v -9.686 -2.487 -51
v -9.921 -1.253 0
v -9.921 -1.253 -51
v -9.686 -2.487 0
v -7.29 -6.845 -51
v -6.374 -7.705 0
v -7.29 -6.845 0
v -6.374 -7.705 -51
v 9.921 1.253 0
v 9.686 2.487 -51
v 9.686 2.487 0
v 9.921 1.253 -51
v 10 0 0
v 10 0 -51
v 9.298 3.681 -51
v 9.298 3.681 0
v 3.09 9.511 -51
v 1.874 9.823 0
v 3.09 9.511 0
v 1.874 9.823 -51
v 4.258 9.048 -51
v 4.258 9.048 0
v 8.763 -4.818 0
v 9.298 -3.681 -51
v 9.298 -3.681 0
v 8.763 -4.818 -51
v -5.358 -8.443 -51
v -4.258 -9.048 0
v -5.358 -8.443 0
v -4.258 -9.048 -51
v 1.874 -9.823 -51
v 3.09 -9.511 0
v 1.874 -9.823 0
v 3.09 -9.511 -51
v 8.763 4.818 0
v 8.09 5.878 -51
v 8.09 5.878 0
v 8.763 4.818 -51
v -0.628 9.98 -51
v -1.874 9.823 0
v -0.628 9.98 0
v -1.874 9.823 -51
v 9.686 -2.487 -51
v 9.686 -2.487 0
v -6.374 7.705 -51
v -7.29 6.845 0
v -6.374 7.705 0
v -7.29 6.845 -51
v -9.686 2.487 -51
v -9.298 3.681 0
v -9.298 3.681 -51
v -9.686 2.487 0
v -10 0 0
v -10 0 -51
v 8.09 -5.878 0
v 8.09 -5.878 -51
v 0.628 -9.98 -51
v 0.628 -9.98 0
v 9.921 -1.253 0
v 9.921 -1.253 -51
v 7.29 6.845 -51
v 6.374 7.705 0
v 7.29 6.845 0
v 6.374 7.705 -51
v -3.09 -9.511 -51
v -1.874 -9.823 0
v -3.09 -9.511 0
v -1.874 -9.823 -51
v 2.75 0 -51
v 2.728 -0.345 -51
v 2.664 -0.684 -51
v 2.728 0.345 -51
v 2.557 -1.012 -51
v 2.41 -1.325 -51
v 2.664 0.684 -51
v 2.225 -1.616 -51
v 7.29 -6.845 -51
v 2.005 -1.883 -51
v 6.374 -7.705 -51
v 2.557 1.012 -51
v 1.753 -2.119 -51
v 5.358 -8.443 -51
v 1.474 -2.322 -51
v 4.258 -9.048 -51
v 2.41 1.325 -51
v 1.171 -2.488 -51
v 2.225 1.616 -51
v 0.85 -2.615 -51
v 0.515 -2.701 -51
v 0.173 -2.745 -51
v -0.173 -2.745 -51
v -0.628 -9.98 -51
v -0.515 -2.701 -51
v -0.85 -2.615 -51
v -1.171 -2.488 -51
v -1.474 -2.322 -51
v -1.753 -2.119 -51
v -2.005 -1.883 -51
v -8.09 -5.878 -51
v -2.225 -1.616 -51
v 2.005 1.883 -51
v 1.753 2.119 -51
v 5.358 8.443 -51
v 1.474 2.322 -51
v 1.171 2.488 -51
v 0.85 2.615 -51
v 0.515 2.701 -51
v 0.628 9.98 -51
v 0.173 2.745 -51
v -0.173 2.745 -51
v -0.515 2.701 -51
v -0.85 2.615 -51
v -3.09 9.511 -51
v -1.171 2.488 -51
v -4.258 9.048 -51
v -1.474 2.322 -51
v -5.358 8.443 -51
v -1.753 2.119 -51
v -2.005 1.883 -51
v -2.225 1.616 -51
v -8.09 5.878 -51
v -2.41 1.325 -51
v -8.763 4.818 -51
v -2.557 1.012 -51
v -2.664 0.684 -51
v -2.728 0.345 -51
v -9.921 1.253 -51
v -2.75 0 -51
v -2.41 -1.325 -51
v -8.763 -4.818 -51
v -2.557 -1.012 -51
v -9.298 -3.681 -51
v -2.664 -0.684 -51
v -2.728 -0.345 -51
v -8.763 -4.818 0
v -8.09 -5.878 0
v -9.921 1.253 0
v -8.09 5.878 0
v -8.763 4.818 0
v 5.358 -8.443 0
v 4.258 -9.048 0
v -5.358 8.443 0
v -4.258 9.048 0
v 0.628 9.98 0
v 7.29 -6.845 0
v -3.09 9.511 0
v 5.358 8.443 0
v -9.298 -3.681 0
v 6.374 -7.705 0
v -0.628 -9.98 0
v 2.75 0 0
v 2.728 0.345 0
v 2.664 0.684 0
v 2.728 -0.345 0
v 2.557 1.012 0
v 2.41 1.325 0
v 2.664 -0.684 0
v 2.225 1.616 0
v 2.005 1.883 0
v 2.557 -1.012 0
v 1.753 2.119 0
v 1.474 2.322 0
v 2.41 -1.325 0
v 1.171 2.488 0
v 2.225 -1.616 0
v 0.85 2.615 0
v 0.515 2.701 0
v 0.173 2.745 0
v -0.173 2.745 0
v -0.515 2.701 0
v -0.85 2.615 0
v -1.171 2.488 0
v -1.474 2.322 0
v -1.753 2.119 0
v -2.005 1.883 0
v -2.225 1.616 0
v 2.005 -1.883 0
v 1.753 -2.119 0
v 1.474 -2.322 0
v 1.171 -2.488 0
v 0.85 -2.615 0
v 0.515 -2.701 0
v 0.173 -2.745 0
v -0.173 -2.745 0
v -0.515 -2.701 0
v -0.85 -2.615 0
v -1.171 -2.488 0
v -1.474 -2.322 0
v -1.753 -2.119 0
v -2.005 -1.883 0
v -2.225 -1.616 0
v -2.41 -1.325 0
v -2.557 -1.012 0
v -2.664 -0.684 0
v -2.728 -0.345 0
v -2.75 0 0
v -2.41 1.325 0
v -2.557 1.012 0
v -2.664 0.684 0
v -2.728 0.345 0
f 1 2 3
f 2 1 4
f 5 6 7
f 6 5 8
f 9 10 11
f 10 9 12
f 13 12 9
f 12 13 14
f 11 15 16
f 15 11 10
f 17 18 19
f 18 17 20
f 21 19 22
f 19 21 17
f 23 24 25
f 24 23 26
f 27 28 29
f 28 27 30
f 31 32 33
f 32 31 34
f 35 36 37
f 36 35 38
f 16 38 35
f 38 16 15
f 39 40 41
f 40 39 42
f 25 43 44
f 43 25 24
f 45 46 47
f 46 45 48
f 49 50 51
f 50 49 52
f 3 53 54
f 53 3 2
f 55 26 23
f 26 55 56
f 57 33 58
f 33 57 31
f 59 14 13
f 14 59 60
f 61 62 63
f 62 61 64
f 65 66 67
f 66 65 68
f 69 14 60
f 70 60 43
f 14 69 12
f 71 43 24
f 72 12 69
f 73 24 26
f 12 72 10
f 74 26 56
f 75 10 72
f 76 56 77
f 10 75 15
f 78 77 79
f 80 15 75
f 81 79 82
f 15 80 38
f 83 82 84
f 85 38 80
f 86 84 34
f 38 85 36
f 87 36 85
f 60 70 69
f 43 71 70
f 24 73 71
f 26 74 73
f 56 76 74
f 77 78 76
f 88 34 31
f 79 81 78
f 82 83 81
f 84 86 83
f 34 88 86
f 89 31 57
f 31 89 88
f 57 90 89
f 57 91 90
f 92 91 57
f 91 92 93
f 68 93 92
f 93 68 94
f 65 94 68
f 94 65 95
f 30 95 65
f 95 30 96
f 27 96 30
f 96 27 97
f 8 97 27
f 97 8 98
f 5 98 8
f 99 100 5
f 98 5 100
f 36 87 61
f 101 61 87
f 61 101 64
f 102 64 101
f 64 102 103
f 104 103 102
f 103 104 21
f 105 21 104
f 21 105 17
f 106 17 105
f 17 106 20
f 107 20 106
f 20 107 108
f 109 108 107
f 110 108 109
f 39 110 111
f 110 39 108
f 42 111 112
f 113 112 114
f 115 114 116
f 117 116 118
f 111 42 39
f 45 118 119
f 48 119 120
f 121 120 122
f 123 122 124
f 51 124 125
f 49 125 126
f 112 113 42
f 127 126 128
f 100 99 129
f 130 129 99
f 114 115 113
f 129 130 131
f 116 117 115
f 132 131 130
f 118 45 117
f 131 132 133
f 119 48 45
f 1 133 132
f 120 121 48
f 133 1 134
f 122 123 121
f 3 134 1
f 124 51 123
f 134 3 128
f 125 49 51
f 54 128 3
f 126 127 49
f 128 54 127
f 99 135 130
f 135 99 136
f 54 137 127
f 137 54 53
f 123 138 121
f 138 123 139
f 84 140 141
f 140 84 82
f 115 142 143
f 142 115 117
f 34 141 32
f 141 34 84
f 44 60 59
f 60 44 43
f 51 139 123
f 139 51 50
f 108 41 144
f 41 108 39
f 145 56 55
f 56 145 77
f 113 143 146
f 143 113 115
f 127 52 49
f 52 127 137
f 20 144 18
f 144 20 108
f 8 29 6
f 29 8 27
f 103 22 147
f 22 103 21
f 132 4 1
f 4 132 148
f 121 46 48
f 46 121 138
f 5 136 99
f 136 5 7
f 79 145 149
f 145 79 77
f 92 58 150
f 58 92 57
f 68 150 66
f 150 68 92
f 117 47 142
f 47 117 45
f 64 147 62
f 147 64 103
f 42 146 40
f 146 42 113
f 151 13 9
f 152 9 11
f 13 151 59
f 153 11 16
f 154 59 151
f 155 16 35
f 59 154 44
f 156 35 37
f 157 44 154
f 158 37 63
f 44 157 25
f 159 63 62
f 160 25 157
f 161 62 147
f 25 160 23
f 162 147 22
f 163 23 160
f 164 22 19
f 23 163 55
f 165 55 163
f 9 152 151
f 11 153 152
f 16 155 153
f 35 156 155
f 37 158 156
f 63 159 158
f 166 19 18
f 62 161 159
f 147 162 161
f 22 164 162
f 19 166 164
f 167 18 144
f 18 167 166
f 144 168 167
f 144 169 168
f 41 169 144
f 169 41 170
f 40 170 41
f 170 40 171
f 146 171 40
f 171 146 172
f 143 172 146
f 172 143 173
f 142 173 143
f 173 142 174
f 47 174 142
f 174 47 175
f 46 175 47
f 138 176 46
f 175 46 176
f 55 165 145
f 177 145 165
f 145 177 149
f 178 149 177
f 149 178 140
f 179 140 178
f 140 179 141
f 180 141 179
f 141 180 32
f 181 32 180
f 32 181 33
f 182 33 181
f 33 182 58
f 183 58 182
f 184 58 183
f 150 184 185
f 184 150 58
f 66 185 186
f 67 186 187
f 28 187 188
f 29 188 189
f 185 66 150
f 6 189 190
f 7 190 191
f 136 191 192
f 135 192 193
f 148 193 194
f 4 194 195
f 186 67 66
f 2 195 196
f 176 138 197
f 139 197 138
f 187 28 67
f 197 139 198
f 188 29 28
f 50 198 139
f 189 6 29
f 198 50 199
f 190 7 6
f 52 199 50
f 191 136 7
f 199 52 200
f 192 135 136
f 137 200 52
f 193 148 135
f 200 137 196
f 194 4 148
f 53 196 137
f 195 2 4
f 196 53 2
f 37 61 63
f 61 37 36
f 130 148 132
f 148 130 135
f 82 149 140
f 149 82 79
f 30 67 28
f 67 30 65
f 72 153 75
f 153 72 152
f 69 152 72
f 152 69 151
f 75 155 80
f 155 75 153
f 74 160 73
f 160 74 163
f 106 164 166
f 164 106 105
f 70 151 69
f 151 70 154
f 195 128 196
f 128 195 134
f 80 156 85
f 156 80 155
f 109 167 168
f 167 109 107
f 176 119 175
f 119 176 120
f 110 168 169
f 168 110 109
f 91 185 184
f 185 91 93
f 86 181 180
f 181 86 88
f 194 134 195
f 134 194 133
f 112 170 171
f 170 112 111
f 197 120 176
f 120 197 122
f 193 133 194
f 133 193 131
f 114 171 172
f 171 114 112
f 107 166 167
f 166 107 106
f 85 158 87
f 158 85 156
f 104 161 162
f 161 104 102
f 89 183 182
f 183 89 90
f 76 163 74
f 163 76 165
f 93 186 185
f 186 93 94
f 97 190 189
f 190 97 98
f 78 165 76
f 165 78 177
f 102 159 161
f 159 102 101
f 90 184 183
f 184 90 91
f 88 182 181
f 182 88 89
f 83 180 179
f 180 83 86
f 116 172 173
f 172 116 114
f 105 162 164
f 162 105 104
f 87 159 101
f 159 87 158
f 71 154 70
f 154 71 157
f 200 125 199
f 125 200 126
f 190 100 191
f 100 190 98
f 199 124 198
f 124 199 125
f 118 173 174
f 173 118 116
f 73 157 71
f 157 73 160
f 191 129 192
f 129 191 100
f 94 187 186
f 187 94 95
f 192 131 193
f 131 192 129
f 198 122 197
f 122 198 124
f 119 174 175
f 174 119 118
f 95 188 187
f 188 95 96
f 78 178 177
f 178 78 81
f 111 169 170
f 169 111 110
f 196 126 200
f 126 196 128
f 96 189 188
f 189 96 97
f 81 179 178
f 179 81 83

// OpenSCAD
$fn = 50;


difference() {
	union() {
		translate(v = [0, 0, -51.0000000000]) {
			cylinder(h = 51, r = 10.0000000000);
		}
		cylinder(h = 0, r = 16.0000000000);
	}
	union() {
		#translate(v = [0, 0, -51]) {
			cylinder(h = 51, r = 2.7500000000);
		}
	}
}
